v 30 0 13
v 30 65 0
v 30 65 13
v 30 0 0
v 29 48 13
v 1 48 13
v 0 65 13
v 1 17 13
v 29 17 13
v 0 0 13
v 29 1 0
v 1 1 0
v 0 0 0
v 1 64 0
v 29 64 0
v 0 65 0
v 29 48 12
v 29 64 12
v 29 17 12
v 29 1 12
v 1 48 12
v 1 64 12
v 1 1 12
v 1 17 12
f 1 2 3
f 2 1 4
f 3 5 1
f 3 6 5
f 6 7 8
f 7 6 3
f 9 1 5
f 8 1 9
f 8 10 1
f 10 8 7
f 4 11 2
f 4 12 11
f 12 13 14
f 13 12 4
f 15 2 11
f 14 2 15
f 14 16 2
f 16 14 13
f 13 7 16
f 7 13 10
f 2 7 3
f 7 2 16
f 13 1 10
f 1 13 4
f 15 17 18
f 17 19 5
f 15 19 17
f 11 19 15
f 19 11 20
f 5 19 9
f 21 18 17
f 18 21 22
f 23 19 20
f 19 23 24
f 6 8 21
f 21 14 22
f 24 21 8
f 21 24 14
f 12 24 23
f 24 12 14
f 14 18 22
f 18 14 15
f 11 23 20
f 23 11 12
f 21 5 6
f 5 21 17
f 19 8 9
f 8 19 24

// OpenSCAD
width = 30;
height = 65;
depth = 13;
shelf = 17;
thickness = 1;

difference() {
	cube([width, height, depth]);
	translate([thickness, thickness, -1]) {
		cube([width - thickness * 2, height - thickness * 2, depth + 1 - thickness]);
	}
	translate([thickness, shelf, -1]) {
		cube([width - thickness * 2, height - shelf * 2, depth + 2]);
	}
}
